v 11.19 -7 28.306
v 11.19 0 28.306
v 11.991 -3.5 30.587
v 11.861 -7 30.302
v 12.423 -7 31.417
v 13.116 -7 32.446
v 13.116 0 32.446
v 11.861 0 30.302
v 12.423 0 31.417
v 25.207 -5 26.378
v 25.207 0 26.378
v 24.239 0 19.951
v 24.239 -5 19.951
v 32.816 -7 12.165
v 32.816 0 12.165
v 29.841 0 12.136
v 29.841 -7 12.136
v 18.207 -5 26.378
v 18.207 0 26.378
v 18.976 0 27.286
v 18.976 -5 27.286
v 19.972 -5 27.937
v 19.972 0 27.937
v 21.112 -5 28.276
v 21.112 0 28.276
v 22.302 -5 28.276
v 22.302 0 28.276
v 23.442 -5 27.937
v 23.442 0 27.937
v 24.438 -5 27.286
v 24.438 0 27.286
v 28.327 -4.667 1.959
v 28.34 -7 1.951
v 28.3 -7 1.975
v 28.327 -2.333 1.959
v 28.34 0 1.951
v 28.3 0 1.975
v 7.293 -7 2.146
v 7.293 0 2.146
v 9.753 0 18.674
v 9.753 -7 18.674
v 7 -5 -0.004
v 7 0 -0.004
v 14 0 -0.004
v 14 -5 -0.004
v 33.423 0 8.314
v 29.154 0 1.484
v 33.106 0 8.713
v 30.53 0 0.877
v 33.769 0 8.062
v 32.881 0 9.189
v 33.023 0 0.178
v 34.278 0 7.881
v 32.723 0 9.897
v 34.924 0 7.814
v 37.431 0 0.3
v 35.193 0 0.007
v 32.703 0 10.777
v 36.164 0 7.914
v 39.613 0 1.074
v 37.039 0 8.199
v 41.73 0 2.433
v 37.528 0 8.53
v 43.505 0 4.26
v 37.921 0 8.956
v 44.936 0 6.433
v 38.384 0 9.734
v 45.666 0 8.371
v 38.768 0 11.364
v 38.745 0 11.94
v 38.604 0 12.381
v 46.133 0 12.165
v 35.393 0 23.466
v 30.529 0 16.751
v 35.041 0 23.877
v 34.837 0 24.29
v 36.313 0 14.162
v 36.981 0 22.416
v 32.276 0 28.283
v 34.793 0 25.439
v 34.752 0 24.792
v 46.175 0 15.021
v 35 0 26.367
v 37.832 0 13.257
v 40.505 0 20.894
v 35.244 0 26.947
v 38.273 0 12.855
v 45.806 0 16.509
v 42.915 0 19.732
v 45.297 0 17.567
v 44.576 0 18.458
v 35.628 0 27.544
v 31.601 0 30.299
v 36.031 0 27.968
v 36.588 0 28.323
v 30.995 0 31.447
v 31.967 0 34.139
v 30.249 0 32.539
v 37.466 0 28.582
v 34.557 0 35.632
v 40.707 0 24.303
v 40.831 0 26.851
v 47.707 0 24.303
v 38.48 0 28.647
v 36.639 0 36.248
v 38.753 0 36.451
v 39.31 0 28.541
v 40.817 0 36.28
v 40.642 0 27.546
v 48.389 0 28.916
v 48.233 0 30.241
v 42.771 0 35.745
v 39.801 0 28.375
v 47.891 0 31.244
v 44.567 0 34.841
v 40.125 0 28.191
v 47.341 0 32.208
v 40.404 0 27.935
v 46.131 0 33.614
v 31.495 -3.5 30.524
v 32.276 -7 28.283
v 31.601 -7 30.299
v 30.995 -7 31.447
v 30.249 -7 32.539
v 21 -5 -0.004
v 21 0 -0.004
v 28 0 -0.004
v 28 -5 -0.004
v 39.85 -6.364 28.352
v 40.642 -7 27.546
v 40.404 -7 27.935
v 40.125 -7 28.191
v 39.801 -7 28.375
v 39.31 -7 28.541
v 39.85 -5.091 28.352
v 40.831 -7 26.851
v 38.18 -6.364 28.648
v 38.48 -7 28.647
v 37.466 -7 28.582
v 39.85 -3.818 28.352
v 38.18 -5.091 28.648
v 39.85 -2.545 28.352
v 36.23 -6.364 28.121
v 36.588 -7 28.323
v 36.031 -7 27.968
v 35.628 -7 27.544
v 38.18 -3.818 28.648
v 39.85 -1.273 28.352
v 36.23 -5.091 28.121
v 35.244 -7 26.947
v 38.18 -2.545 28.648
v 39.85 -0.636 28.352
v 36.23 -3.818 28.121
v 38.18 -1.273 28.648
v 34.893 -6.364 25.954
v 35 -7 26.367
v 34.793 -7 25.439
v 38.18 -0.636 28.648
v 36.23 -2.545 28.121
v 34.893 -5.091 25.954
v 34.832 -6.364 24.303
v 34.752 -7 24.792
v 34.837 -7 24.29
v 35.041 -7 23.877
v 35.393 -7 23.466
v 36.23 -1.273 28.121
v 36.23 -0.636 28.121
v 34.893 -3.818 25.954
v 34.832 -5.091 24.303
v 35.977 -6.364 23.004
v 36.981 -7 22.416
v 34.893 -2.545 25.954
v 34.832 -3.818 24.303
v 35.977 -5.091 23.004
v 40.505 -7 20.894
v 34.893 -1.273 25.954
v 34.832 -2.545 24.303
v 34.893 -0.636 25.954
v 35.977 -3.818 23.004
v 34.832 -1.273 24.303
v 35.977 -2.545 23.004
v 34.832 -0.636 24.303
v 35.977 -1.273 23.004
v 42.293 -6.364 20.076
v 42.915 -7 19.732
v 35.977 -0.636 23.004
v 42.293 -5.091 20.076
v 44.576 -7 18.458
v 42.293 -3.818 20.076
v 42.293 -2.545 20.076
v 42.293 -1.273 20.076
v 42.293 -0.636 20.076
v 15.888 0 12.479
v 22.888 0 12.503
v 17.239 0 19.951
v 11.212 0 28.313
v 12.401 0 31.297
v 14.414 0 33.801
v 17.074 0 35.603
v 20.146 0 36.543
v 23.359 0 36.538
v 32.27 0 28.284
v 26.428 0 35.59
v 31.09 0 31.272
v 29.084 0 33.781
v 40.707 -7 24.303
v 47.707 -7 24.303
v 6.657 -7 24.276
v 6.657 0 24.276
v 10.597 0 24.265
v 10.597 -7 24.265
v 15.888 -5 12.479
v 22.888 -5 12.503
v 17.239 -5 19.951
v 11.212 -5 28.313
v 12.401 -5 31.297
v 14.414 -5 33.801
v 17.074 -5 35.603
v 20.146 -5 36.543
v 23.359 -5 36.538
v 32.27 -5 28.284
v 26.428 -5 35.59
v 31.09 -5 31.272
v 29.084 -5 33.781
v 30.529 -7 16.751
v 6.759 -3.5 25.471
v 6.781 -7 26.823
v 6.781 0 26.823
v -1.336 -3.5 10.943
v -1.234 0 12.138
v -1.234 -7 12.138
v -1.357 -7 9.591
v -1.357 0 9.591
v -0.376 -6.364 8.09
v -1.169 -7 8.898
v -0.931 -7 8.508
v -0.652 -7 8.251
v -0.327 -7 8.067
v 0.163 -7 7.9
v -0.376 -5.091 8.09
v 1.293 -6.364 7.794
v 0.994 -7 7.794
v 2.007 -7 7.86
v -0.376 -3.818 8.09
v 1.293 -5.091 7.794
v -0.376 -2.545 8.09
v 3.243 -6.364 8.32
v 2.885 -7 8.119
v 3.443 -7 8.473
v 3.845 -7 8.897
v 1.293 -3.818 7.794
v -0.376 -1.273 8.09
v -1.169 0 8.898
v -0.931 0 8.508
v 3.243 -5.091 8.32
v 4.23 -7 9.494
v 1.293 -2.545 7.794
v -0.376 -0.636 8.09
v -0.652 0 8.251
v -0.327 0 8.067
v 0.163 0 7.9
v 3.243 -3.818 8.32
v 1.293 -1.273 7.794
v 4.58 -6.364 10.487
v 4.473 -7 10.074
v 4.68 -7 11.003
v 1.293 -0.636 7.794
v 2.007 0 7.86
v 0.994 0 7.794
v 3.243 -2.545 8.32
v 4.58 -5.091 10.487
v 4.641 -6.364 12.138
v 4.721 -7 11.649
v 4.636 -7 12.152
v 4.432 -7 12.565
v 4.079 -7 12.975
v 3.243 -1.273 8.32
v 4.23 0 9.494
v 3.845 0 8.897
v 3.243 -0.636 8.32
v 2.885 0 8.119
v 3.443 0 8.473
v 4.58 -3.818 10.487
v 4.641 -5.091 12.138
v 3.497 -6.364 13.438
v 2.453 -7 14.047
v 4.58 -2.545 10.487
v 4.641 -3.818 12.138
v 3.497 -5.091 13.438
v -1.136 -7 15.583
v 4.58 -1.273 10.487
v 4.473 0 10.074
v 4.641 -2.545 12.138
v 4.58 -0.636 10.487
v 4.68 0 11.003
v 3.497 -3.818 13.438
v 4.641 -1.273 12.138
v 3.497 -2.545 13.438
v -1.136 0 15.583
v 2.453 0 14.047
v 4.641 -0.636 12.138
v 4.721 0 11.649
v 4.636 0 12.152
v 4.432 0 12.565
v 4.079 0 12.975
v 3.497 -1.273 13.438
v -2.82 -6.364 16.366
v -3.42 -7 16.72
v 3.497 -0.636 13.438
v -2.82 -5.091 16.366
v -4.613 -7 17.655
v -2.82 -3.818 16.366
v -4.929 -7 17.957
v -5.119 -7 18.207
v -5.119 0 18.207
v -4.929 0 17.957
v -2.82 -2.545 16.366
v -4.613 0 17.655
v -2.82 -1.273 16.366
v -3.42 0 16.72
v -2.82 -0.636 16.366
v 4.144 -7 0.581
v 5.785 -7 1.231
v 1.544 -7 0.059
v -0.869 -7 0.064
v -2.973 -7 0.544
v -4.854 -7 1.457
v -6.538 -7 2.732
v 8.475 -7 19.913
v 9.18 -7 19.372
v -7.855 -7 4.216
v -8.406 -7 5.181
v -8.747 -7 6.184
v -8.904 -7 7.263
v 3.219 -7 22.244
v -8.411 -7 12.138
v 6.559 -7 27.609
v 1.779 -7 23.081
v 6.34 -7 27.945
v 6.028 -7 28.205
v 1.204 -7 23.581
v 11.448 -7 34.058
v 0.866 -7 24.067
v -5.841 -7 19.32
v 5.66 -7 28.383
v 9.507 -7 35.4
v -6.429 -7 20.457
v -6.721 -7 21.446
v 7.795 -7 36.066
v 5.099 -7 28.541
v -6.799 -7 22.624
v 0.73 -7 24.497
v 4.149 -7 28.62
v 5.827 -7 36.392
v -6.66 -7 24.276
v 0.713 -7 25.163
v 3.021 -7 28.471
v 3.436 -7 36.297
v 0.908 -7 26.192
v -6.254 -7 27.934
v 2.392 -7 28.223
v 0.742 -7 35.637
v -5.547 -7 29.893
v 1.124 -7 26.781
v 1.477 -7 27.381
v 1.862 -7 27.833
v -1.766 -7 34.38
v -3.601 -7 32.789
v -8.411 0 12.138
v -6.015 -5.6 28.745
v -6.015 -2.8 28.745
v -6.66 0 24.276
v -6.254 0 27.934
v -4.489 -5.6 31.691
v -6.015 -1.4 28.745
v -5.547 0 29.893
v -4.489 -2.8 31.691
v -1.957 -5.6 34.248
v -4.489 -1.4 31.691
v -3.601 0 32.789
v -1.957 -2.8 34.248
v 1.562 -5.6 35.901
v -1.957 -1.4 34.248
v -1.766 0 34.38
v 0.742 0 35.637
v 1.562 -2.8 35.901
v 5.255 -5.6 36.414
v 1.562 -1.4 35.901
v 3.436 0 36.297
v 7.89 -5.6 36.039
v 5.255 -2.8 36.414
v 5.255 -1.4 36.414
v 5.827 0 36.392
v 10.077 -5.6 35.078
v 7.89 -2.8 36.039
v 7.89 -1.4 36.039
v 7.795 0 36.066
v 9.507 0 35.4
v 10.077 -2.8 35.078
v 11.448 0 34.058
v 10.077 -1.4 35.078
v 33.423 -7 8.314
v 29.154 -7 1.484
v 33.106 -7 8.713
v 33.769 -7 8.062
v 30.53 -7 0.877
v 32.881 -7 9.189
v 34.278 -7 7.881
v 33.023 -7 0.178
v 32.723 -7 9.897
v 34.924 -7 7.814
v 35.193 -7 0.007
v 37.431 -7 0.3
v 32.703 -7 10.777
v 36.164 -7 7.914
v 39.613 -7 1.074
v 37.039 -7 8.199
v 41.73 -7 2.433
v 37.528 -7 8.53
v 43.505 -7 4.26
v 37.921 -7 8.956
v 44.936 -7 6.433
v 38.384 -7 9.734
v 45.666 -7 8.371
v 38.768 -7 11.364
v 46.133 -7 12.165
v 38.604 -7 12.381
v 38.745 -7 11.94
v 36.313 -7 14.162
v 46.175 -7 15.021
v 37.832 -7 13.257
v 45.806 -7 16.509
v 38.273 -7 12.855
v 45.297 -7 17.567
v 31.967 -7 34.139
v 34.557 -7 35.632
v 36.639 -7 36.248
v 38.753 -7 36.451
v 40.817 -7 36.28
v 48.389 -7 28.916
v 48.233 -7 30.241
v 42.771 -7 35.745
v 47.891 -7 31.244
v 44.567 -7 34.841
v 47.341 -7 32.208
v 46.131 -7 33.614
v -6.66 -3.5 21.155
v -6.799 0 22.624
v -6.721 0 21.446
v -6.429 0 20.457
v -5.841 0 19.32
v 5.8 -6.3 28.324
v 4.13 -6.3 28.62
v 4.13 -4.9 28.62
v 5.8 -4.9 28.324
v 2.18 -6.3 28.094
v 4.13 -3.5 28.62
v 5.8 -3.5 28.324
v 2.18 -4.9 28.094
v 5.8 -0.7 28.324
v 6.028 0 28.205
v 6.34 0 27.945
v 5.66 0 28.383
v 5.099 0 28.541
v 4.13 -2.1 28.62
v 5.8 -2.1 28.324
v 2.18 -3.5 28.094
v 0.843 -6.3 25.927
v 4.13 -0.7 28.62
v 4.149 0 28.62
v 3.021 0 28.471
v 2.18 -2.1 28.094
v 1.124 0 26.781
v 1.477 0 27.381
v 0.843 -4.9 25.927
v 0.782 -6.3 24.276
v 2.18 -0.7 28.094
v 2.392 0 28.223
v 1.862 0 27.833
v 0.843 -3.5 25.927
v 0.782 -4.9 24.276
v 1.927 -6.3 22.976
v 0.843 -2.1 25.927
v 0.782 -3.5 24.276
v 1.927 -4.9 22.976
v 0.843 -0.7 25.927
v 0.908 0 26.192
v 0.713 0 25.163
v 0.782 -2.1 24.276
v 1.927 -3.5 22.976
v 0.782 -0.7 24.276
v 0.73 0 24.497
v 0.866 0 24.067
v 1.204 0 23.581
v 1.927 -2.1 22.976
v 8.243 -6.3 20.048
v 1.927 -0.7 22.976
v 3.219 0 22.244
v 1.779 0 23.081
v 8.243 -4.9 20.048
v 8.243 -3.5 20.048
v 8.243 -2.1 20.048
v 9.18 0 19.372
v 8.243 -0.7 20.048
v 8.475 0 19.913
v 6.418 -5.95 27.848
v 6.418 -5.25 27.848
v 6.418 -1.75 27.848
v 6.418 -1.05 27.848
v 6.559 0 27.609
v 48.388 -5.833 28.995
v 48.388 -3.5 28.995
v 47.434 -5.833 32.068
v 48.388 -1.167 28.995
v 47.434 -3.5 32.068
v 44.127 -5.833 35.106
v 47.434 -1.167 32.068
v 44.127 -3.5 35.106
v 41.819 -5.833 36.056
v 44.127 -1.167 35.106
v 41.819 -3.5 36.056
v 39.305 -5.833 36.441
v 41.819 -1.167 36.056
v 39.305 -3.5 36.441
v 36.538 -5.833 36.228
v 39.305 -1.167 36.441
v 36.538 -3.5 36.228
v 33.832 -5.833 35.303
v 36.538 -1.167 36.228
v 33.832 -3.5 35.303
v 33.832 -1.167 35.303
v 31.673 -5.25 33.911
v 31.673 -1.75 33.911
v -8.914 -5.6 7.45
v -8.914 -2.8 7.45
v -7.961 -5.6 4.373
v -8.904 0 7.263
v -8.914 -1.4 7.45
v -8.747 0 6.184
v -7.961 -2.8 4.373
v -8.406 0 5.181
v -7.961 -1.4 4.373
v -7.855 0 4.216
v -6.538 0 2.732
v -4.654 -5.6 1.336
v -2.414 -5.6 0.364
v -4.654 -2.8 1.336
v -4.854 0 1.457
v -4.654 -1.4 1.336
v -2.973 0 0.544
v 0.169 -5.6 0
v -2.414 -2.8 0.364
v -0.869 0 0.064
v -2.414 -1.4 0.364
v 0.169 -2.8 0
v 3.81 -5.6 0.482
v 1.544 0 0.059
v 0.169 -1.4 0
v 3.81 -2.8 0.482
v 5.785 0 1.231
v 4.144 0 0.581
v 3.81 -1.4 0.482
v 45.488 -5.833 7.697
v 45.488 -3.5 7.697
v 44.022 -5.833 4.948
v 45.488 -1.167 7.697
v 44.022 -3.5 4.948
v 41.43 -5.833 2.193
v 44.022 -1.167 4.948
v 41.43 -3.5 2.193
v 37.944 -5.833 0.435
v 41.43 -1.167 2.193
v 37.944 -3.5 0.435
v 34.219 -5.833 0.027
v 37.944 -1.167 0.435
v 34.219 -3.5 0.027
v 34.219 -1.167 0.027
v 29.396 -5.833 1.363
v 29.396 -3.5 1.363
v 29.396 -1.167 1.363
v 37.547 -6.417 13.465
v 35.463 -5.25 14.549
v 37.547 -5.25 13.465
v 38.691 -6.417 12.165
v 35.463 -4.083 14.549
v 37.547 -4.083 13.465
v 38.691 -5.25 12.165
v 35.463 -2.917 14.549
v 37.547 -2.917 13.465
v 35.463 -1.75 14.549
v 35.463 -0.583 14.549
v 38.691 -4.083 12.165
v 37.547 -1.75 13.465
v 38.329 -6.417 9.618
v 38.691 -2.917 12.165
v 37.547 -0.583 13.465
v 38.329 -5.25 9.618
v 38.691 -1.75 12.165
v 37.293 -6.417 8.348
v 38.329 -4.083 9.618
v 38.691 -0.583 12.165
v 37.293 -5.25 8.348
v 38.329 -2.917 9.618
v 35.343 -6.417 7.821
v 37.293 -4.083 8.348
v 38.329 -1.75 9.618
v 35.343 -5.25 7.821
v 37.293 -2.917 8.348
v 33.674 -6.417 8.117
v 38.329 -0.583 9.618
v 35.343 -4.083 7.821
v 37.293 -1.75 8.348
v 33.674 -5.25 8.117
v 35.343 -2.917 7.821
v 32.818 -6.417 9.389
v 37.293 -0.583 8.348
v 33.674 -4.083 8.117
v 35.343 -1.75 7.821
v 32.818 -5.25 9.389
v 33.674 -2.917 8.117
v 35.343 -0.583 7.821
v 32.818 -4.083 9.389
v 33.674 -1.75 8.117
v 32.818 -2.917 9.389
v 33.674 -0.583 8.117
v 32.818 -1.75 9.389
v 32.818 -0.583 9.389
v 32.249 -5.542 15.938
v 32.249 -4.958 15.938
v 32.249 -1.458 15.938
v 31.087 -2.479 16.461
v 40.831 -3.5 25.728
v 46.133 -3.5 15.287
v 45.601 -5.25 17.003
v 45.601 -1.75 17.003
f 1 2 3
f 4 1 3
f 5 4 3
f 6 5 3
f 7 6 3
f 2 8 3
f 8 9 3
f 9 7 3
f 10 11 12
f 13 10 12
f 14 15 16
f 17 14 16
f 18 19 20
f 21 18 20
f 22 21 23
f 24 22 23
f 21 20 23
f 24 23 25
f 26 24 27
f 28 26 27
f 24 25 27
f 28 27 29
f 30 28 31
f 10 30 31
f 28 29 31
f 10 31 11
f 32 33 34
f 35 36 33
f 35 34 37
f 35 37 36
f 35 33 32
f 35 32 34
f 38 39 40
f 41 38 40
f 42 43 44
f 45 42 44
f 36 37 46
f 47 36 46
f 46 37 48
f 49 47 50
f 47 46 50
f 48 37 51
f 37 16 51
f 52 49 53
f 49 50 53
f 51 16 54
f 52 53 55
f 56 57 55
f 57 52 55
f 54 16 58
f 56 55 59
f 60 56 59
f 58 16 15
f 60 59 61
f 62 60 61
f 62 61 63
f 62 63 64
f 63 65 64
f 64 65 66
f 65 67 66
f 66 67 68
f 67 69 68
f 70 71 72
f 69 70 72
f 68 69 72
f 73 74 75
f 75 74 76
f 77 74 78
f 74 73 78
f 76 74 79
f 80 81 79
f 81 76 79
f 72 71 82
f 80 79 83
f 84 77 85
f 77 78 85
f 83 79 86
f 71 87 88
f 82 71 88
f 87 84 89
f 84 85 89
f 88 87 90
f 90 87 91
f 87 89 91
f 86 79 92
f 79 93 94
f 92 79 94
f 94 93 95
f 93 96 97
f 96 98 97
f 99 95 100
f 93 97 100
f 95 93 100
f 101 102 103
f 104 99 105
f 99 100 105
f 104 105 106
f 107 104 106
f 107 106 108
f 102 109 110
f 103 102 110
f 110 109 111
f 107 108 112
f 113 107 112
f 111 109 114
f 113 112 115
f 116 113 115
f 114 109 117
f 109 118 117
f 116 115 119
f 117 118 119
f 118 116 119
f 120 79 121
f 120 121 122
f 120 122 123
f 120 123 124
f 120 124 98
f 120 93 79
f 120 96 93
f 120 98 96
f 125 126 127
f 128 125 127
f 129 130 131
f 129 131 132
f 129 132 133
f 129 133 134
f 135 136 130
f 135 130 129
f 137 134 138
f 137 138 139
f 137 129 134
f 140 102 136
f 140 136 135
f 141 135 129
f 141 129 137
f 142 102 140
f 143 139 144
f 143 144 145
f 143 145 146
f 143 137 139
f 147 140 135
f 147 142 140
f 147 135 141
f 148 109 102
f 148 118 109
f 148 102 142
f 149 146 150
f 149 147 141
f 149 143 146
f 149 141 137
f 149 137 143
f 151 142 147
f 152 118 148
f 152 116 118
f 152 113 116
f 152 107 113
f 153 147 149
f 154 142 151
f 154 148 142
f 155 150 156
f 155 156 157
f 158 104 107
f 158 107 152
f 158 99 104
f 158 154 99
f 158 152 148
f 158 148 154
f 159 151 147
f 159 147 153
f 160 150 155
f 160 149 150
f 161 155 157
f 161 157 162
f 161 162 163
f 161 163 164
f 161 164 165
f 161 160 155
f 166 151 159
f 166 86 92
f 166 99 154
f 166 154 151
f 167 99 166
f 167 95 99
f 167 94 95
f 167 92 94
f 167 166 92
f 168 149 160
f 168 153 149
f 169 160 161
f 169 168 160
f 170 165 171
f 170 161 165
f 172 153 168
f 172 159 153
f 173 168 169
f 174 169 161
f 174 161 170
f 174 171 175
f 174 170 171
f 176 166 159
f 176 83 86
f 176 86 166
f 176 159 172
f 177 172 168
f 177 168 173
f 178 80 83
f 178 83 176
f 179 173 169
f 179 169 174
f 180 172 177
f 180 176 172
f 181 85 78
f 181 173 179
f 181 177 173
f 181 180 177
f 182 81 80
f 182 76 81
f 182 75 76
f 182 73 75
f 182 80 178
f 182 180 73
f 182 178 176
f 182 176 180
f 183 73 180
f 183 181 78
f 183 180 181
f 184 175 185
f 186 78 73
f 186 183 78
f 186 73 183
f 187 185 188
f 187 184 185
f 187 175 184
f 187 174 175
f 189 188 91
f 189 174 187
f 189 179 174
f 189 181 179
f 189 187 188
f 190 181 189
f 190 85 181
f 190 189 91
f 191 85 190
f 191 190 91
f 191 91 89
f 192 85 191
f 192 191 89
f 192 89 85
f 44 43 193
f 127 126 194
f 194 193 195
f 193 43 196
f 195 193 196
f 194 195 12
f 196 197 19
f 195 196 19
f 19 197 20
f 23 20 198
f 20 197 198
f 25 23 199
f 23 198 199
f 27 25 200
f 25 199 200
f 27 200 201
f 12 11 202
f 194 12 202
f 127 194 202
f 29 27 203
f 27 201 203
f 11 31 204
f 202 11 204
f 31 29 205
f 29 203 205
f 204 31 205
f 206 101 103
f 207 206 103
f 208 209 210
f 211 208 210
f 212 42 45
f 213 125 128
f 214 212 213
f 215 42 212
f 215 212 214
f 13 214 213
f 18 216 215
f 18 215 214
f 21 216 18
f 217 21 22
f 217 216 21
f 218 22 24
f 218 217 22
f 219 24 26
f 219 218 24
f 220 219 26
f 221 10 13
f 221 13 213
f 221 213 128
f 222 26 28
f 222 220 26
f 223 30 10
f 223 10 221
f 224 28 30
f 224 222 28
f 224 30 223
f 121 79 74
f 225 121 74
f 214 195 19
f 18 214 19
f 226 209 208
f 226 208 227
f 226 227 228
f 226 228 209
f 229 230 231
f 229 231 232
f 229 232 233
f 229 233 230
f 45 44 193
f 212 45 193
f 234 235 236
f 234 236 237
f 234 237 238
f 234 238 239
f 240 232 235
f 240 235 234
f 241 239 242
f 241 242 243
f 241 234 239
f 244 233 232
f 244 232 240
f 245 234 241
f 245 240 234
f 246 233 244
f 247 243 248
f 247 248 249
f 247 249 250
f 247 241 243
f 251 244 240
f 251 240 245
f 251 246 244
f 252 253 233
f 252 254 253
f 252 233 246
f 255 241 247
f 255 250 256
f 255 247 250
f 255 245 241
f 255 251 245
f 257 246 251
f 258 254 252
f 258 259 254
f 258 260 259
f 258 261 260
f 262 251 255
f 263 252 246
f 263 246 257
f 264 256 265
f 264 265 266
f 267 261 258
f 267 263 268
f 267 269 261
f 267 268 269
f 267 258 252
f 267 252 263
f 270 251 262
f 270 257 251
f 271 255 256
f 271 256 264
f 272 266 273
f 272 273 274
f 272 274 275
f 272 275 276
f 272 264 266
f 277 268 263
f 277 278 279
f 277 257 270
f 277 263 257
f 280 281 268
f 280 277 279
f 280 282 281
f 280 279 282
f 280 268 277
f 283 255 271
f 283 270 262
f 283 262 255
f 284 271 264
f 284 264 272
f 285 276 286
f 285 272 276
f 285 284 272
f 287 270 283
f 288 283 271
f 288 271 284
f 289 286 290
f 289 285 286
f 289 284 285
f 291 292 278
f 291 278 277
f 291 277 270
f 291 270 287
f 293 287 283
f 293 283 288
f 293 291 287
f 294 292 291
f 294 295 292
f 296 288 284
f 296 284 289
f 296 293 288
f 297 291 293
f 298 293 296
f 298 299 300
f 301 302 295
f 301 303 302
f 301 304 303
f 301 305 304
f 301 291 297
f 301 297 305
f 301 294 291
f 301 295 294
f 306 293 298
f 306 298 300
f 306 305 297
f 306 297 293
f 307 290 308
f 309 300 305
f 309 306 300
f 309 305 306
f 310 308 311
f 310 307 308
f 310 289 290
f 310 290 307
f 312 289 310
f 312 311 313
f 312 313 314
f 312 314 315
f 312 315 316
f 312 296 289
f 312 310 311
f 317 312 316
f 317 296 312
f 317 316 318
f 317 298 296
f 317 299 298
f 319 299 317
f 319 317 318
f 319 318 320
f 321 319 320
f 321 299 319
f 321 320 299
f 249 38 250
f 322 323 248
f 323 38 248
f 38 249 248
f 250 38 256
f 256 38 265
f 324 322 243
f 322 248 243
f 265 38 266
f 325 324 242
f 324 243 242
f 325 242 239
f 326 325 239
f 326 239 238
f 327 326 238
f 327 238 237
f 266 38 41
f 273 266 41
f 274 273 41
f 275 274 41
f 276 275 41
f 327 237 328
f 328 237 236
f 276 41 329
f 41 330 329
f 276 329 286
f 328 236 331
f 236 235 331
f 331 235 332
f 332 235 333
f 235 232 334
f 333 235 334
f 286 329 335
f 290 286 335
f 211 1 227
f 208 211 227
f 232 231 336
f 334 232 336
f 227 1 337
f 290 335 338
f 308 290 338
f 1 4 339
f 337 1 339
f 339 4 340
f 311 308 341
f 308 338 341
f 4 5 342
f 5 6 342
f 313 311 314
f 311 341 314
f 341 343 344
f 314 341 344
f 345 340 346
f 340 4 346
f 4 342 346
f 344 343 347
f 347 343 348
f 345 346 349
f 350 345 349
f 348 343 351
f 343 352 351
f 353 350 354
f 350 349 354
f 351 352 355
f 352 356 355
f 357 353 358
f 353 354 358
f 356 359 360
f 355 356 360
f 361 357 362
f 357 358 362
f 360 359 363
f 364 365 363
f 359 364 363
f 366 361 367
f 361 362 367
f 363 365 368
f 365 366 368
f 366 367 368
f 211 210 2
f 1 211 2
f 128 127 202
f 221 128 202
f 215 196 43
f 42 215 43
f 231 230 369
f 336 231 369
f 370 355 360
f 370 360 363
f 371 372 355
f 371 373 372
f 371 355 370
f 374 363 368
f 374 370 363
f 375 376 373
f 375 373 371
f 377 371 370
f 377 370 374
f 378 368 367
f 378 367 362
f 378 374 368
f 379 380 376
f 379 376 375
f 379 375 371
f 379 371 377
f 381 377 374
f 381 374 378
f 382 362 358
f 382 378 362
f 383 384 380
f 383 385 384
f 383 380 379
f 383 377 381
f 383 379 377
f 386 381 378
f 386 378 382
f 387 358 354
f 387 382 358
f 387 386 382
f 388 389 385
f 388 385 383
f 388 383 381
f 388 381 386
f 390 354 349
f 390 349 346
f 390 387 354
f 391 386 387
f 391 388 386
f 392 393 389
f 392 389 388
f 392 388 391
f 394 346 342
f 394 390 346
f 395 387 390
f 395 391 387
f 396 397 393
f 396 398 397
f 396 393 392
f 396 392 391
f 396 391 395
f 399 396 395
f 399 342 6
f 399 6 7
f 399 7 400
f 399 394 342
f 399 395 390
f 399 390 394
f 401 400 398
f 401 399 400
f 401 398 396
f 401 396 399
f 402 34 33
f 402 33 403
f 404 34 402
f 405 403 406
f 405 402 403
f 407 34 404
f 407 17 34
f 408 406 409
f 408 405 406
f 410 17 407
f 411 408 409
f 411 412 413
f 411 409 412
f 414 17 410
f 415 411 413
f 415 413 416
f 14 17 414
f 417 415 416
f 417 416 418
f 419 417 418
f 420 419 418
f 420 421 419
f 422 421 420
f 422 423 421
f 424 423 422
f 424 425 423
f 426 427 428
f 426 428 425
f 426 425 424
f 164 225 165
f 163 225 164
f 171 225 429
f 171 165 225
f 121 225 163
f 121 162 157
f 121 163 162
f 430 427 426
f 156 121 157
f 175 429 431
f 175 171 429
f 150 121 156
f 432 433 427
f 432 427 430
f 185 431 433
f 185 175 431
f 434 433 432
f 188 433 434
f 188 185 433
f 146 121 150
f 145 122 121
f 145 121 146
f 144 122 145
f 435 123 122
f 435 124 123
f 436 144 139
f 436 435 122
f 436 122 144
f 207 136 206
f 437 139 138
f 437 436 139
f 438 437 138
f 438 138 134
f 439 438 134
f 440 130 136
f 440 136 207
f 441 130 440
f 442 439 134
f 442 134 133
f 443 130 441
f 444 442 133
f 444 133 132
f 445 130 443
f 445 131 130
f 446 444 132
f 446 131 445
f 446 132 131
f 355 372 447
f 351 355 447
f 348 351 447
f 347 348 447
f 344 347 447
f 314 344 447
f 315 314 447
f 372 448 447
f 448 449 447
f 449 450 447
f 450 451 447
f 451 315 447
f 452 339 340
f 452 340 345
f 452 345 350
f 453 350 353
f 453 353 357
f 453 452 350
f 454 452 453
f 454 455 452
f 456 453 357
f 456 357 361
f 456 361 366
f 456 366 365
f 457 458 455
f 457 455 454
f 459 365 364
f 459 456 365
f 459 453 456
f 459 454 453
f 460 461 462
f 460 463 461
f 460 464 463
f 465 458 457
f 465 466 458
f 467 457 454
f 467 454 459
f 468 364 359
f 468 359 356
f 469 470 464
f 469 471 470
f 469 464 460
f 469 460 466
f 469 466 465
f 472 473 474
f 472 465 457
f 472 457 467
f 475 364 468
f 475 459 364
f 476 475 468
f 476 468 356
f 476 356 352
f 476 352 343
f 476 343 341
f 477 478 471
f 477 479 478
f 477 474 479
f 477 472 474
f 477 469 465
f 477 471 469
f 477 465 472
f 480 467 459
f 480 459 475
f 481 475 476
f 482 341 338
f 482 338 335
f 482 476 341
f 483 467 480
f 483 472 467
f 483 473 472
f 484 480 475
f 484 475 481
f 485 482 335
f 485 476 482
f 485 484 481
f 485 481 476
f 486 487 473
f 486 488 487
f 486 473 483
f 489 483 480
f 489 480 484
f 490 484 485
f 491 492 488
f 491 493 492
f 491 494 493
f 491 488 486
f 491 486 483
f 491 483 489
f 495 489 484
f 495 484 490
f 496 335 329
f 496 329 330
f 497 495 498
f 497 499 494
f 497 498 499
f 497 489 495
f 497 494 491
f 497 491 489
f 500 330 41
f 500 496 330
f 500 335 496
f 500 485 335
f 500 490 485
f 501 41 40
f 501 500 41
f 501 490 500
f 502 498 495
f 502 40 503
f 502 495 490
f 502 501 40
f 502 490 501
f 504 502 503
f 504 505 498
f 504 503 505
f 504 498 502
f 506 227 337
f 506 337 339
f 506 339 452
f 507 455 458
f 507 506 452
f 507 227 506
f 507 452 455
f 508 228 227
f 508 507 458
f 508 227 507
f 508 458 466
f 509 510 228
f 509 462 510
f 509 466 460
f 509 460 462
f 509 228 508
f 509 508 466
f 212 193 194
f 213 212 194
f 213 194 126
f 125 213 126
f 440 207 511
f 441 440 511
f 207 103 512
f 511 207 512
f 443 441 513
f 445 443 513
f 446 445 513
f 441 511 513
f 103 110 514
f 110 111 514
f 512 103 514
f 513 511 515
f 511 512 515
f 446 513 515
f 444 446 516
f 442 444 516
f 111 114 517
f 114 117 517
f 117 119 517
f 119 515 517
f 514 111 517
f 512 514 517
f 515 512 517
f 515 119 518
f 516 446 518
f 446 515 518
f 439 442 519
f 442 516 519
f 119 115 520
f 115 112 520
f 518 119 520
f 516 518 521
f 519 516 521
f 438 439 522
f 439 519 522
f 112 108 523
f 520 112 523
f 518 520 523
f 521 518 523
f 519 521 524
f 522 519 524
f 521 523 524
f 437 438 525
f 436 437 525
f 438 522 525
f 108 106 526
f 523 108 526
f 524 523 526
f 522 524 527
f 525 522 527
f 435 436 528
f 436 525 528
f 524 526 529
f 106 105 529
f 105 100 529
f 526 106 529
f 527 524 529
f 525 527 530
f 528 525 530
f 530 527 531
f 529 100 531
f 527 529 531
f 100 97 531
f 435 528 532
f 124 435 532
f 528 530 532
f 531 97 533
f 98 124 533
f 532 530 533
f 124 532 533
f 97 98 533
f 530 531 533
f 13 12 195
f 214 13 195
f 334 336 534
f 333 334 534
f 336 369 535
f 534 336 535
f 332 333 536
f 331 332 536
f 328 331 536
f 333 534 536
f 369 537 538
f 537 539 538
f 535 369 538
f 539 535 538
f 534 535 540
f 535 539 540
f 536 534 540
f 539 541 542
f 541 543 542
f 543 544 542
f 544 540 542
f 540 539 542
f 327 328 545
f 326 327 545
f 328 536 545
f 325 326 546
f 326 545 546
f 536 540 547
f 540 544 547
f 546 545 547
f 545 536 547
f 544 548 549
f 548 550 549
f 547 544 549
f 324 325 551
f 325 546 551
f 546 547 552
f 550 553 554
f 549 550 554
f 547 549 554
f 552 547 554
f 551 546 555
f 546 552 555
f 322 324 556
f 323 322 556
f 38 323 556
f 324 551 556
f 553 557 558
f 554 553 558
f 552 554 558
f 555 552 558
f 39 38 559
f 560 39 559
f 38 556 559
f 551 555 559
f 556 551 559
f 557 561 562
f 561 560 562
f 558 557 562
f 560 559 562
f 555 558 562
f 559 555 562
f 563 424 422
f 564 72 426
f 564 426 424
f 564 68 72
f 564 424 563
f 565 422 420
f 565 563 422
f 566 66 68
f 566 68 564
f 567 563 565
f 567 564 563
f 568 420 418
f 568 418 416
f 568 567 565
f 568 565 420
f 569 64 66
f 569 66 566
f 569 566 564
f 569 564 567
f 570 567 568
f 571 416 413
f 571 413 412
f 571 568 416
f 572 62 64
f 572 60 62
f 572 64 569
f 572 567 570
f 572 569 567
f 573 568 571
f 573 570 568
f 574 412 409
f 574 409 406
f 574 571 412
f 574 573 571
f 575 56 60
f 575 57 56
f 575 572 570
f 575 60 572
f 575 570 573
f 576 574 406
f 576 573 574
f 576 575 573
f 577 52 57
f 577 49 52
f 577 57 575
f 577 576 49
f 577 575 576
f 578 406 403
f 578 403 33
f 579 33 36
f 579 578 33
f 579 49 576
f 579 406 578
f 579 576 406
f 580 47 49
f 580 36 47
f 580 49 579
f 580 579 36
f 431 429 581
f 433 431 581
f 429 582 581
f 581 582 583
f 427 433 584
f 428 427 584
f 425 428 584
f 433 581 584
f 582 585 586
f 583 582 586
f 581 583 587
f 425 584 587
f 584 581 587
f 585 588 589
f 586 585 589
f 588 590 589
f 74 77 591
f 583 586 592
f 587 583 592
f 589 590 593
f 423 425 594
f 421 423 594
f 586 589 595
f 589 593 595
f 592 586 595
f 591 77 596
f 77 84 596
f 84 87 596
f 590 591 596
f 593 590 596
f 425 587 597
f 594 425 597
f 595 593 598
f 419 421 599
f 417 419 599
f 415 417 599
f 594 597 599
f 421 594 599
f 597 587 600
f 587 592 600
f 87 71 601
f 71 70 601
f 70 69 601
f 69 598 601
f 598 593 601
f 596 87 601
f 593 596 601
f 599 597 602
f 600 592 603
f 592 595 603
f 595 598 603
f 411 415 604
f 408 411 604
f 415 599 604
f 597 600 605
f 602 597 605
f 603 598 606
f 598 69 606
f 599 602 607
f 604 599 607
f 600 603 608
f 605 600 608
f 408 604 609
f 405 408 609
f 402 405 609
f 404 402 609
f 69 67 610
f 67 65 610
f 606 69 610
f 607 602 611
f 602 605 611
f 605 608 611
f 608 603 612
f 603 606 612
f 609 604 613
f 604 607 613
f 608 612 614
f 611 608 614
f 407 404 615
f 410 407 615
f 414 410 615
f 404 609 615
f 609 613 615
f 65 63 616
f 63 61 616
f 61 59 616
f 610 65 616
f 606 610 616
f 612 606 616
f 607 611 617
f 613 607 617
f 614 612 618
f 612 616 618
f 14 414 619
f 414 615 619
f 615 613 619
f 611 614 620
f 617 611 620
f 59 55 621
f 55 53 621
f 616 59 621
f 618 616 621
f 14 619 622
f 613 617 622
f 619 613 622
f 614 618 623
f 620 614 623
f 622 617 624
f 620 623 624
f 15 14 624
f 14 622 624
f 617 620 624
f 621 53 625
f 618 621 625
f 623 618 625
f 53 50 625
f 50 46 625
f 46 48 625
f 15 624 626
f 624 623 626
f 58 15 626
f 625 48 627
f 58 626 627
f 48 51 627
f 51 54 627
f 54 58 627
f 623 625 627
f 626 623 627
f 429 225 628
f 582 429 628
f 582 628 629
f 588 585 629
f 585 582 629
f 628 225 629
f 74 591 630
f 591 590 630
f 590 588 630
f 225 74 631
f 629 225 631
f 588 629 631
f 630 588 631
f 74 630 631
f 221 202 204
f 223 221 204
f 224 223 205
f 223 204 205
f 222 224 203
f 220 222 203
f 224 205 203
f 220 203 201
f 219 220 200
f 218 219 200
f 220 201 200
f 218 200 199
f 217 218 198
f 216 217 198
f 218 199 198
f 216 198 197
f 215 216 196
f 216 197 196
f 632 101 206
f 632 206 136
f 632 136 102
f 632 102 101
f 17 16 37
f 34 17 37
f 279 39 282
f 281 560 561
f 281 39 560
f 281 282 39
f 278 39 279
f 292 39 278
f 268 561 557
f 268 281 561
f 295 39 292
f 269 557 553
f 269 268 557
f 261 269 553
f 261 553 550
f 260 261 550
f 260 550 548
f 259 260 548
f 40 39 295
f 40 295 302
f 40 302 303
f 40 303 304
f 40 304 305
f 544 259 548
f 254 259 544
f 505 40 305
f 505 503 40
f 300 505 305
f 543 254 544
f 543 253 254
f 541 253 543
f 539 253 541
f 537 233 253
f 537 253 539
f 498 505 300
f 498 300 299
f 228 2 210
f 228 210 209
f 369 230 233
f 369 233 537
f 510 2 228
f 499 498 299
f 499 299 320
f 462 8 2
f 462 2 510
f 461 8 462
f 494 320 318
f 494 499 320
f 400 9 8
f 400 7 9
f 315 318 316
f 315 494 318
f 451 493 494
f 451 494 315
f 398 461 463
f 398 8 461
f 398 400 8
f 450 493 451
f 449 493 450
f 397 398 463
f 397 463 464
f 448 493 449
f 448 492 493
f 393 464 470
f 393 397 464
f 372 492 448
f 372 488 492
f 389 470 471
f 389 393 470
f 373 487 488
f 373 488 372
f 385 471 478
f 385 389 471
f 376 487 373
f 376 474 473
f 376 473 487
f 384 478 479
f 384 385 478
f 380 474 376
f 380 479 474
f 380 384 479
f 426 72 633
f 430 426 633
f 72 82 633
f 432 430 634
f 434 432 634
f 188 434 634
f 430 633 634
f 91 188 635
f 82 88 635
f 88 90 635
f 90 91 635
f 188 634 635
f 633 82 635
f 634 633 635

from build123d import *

# Parameters (mm, degrees)
F3_DEPTH = 5
F4_DEPTH = 7
F5_DEPTH = 7


with BuildPart() as f3:
    # F0 (on Front) → F3 (new body)
    with BuildSketch(Plane.XZ):
        with BuildLine():
            Line((11.2122112379, 28.3125324846), (6.9999989204, -0.003887688))
            Line((6.9999989204, -0.003887688), (13.9999989204, -0.003887688))
            Line((13.9999989204, -0.003887688), (15.8880344042, 12.4787572106))
            Line((15.8880344042, 12.4787572106), (22.8879924549, 12.5029912455))
            Line((22.8879924549, 12.5029912455), (20.9999989204, -0.003887688))
            Line((20.9999989204, -0.003887688), (27.9999989204, -0.003887688))
            Line((27.9999989204, -0.003887688), (32.2701971666, 28.2837369844))
            ThreePointArc((32.2701971666, 28.2837369844), (21.7526391673, 36.6604597903), (11.2122112379, 28.3125324846))
        make_face()
        with BuildLine():
            Line((24.2392167098, 19.9508205977), (17.2392167098, 19.9508205977))
            Line((17.2392167098, 19.9508205977), (18.2073064438, 26.3783241774))
            ThreePointArc((18.2073064438, 26.3783241774), (21.7073064438, 28.3189770721), (25.2073064438, 26.3783241774))
            Line((25.2073064438, 26.3783241774), (24.2392167098, 19.9508205977))
        make_face(mode=Mode.SUBTRACT)
    extrude(amount=F3_DEPTH)


with BuildPart() as f4:
    # F1 (on Front) → F4 (new body)
    with BuildSketch(Plane.XZ):
        with BuildLine():
            add(Edge.make_bspline(
                [(-6.6599815696, 24.2759825592), (-6.6061565064, 25.7220949595), (-6.4863727312, 28.9462347722), (-2.4977578924, 35.0722468726), (5.1808687263, 37.0140672644), (10.2150214978, 35.4276204541), (12.1755249809, 33.3973188604), (13.1163168699, 32.4456244707)],
                knots=[0, 0, 0, 0, 0.1812055492, 0.4042165334, 0.638222374, 0.8289952391, 1, 1, 1, 1], degree=3))
            add(Edge.make_bspline(
                [(-6.6599815696, 24.2759825592), (-6.782374854, 23.213841063), (-7.0311202854, 21.0552026541), (-5.7632557996, 19.1664123967), (-5.1192343235, 18.2069869194)],
                knots=[0, 0, 0, 0, 0.492042341, 1, 1, 1, 1], degree=3))
            add(Edge.make_bspline(
                [(-1.3573709875, 9.5905314094), (-1.2263524235, 8.7061990832), (-0.5024158287, 7.9497102787), (1.3048064984, 7.6859942695), (3.3524740944, 8.069839421), (4.3398051965, 9.5854586005), (4.5920459217, 10.4522758633), (4.9351412842, 12.2783841142), (3.4358207169, 13.5787067299), (1.4777022446, 14.5526211568), (-2.8915169094, 16.2288104057), (-4.1768306804, 17.2877126924), (-4.9745802013, 17.9500296757), (-5.1192343235, 18.2069869194)],
                knots=[0, 0, 0, 0, 0.0891719414, 0.1758875853, 0.2705170797, 0.3557760067, 0.4205370175, 0.5061284604, 0.5937609792, 0.6958025757, 0.8388997888, 0.9276642336, 1, 1, 1, 1], degree=3))
            add(Edge.make_bspline(
                [(-1.2337389512, 12.1379912796), (-1.2882114388, 11.5846401907), (-1.3402192541, 10.9462795863), (-1.3804244809, 10.2129696763), (-1.3573709875, 9.5905314094)],
                knots=[0, 0, 0, 0, 0.4849327242, 1, 1, 1, 1], degree=3))
            Line((-1.2337389512, 12.1379912796), (-8.4114907848, 12.1379912796))
            add(Edge.make_bspline(
                [(-8.4114907848, 12.1379912796), (-8.6924735771, 10.4873391148), (-9.2020693869, 7.4767358258), (-8.2597683385, 4.1854235086), (-4.6975559252, 0.9499932484), (0.174722876, -0.5523340249), (5.2226553008, 0.602676311), (7.2931549512, 2.1457294933)],
                knots=[0, 0, 0, 0, 0.1964978655, 0.3589328321, 0.5506962732, 0.7531431874, 1, 1, 1, 1], degree=3))
            Line((7.2931549512, 2.1457294933), (9.7529226914, 18.6736639589))
            add(Edge.make_bspline(
                [(6.7806504667, 26.8234424293), (6.6403814403, 27.7702123414), (5.9298529184, 28.4362038703), (4.1172538238, 28.7361985341), (2.0711144864, 28.3420870979), (1.0834026676, 26.8288823566), (0.8312986309, 25.9616215338), (0.4878892522, 24.1353828571), (1.9884493947, 22.8362485566), (3.9404576221, 21.8562153523), (8.4219899848, 20.1768119309), (9.3139520404, 19.3007670418), (9.7529226914, 18.6736639589)],
                knots=[0, 0, 0, 0, 0.095467856, 0.1883059894, 0.2896167246, 0.3808952908, 0.4502287016, 0.5418632609, 0.6356830045, 0.7449291674, 0.8981296462, 1, 1, 1, 1], degree=3))
            add(Edge.make_bspline(
                [(6.6570184304, 24.2759825592), (6.711490918, 24.8293336481), (6.7634987332, 25.4676942525), (6.80370396, 26.2010041624), (6.7806504667, 26.8234424293)],
                knots=[0, 0, 0, 0, 0.4849327242, 1, 1, 1, 1], degree=3))
            Line((6.6570184304, 24.2759825592), (10.5970697477, 24.2653992027))
            Line((10.5970697477, 24.2653992027), (11.1901527271, 28.3061861992))
            add(Edge.make_bspline(
                [(11.1901527271, 28.3061861992), (11.3847417426, 29.1364929683), (11.9234300988, 30.5987060232), (12.6628768915, 31.8682861898), (13.1163168699, 32.4456244707)],
                knots=[0, 0, 0, 0, 0.513299169, 1, 1, 1, 1], degree=3))
        make_face()
    extrude(amount=F4_DEPTH)


with BuildPart() as f5:
    # F2 (on Front) → F5 (new body)
    with BuildSketch(Plane.XZ):
        with BuildLine():
            Line((40.7070289281, 24.3034501637), (47.7070289281, 24.3034501637))
            add(Edge.make_bspline(
                [(47.7070289281, 24.3034501637), (48.0588512775, 25.9328191081), (48.7219935663, 28.9737790764), (47.7062392193, 32.2494612662), (44.2389948753, 35.5119613146), (39.2873114419, 36.8371475878), (33.8561527415, 35.8710554484), (30.8342708515, 33.2988147102), (30.2490498871, 32.5386859477)],
                knots=[0, 0, 0, 0, 0.1698627261, 0.3097954704, 0.4750977612, 0.6496093288, 0.8340443676, 1, 1, 1, 1], degree=3))
            add(Edge.make_bspline(
                [(32.2756581008, 28.2830372453), (32.0423555546, 29.236499996), (31.6083000986, 30.4551560803), (30.7202089166, 31.9451489298), (30.2490498871, 32.5386859477)],
                knots=[0, 0, 0, 0, 0.50019899, 1, 1, 1, 1], degree=3))
            Line((32.2756581008, 28.2830372453), (30.5293612182, 16.7514197528))
            add(Edge.make_bspline(
                [(30.5293612182, 16.7514197528), (30.7179905571, 16.6503390755), (31.2491175786, 16.3418175238), (35.6018795043, 14.5217056209), (37.4714878588, 13.6174146267), (38.9887318436, 12.3032058475), (38.6412005965, 10.4798483482), (38.3905840845, 9.614082998), (37.3994517702, 8.0902336596), (35.3666908063, 7.7420076867), (33.5532638013, 7.8762737947), (32.6658742269, 9.3628376072), (32.6883507297, 10.9705748359), (32.7896469957, 11.7680724832), (32.8162715465, 12.1654588842)],
                knots=[0, 0, 0, 0, 0.0563670855, 0.1929088194, 0.2902757507, 0.3738937038, 0.4555640856, 0.5173583058, 0.5987114046, 0.6890057923, 0.7717488738, 0.8504307425, 0.9304189068, 1, 1, 1, 1], degree=3))
            Line((32.8162715465, 12.1654588842), (29.8411697149, 12.1357198805))
            Line((29.8411697149, 12.1357198805), (28.3000655472, 1.9751281943))
            add(Edge.make_bspline(
                [(28.3399428197, 1.9506151357), (28.3266544762, 1.9587884304), (28.3133682934, 1.9669577735), (28.3000655472, 1.9751281943)],
                knots=[0.9957797989, 0.9957797989, 0.9957797989, 0.9957797989, 1, 1, 1, 1], degree=3))
            add(Edge.make_bspline(
                [(46.1332715465, 12.1654588842), (45.9932699339, 11.3667022607), (45.7179821557, 9.7964122521), (45.8345614588, 7.5065066252), (41.8473829749, 1.2294949823), (34.4854407651, -0.7123590527), (29.5194253321, 1.2213504858), (28.6276431409, 1.7736585781), (28.3399428197, 1.9506151357)],
                knots=[0, 0, 0, 0, 0.1301848674, 0.2563418588, 0.4794487055, 0.713555135, 0.9044100049, 0.9957797989, 0.9957797989, 0.9957797989, 0.9957797989], degree=3))
            add(Edge.make_bspline(
                [(46.1332715465, 12.1654588842), (46.2537889802, 13.2113215559), (46.3976538225, 15.2742330204), (45.434245385, 17.6620311683), (44.5760017066, 18.4580917618)],
                knots=[0, 0, 0, 0, 0.4845010945, 1, 1, 1, 1], degree=3))
            add(Edge.make_bspline(
                [(40.8306609644, 26.8509100339), (40.6990210117, 27.7394365297), (39.9759836544, 28.4898464564), (38.1684066427, 28.7559986815), (36.1208167951, 28.3714668164), (35.1335391231, 26.8560005895), (34.881063841, 25.9891820202), (34.5390921594, 24.1629312021), (36.0336343485, 22.8632566597), (38.0154398125, 21.8861146009), (42.27253222, 20.2259216093), (43.8057266716, 19.1468495988), (44.2334094452, 18.7890354728), (44.5760017066, 18.4580917618)],
                knots=[0, 0, 0, 0, 0.0895948619, 0.1767217766, 0.2718000754, 0.3574633643, 0.4225315205, 0.5085289026, 0.5965770407, 0.6991025953, 0.8428784831, 0.9318426312, 1, 1, 1, 1], degree=3))
            add(Edge.make_bspline(
                [(40.7070289281, 24.3034501637), (40.7591645885, 24.7922701366), (40.8574963761, 25.7142214714), (40.8392384914, 26.4875850011), (40.8306609644, 26.8509100339)],
                knots=[0, 0, 0, 0, 0.5302014916, 1, 1, 1, 1], degree=3))
        make_face()
    extrude(amount=F5_DEPTH)


solid = Compound([f3.part, f4.part, f5.part])
